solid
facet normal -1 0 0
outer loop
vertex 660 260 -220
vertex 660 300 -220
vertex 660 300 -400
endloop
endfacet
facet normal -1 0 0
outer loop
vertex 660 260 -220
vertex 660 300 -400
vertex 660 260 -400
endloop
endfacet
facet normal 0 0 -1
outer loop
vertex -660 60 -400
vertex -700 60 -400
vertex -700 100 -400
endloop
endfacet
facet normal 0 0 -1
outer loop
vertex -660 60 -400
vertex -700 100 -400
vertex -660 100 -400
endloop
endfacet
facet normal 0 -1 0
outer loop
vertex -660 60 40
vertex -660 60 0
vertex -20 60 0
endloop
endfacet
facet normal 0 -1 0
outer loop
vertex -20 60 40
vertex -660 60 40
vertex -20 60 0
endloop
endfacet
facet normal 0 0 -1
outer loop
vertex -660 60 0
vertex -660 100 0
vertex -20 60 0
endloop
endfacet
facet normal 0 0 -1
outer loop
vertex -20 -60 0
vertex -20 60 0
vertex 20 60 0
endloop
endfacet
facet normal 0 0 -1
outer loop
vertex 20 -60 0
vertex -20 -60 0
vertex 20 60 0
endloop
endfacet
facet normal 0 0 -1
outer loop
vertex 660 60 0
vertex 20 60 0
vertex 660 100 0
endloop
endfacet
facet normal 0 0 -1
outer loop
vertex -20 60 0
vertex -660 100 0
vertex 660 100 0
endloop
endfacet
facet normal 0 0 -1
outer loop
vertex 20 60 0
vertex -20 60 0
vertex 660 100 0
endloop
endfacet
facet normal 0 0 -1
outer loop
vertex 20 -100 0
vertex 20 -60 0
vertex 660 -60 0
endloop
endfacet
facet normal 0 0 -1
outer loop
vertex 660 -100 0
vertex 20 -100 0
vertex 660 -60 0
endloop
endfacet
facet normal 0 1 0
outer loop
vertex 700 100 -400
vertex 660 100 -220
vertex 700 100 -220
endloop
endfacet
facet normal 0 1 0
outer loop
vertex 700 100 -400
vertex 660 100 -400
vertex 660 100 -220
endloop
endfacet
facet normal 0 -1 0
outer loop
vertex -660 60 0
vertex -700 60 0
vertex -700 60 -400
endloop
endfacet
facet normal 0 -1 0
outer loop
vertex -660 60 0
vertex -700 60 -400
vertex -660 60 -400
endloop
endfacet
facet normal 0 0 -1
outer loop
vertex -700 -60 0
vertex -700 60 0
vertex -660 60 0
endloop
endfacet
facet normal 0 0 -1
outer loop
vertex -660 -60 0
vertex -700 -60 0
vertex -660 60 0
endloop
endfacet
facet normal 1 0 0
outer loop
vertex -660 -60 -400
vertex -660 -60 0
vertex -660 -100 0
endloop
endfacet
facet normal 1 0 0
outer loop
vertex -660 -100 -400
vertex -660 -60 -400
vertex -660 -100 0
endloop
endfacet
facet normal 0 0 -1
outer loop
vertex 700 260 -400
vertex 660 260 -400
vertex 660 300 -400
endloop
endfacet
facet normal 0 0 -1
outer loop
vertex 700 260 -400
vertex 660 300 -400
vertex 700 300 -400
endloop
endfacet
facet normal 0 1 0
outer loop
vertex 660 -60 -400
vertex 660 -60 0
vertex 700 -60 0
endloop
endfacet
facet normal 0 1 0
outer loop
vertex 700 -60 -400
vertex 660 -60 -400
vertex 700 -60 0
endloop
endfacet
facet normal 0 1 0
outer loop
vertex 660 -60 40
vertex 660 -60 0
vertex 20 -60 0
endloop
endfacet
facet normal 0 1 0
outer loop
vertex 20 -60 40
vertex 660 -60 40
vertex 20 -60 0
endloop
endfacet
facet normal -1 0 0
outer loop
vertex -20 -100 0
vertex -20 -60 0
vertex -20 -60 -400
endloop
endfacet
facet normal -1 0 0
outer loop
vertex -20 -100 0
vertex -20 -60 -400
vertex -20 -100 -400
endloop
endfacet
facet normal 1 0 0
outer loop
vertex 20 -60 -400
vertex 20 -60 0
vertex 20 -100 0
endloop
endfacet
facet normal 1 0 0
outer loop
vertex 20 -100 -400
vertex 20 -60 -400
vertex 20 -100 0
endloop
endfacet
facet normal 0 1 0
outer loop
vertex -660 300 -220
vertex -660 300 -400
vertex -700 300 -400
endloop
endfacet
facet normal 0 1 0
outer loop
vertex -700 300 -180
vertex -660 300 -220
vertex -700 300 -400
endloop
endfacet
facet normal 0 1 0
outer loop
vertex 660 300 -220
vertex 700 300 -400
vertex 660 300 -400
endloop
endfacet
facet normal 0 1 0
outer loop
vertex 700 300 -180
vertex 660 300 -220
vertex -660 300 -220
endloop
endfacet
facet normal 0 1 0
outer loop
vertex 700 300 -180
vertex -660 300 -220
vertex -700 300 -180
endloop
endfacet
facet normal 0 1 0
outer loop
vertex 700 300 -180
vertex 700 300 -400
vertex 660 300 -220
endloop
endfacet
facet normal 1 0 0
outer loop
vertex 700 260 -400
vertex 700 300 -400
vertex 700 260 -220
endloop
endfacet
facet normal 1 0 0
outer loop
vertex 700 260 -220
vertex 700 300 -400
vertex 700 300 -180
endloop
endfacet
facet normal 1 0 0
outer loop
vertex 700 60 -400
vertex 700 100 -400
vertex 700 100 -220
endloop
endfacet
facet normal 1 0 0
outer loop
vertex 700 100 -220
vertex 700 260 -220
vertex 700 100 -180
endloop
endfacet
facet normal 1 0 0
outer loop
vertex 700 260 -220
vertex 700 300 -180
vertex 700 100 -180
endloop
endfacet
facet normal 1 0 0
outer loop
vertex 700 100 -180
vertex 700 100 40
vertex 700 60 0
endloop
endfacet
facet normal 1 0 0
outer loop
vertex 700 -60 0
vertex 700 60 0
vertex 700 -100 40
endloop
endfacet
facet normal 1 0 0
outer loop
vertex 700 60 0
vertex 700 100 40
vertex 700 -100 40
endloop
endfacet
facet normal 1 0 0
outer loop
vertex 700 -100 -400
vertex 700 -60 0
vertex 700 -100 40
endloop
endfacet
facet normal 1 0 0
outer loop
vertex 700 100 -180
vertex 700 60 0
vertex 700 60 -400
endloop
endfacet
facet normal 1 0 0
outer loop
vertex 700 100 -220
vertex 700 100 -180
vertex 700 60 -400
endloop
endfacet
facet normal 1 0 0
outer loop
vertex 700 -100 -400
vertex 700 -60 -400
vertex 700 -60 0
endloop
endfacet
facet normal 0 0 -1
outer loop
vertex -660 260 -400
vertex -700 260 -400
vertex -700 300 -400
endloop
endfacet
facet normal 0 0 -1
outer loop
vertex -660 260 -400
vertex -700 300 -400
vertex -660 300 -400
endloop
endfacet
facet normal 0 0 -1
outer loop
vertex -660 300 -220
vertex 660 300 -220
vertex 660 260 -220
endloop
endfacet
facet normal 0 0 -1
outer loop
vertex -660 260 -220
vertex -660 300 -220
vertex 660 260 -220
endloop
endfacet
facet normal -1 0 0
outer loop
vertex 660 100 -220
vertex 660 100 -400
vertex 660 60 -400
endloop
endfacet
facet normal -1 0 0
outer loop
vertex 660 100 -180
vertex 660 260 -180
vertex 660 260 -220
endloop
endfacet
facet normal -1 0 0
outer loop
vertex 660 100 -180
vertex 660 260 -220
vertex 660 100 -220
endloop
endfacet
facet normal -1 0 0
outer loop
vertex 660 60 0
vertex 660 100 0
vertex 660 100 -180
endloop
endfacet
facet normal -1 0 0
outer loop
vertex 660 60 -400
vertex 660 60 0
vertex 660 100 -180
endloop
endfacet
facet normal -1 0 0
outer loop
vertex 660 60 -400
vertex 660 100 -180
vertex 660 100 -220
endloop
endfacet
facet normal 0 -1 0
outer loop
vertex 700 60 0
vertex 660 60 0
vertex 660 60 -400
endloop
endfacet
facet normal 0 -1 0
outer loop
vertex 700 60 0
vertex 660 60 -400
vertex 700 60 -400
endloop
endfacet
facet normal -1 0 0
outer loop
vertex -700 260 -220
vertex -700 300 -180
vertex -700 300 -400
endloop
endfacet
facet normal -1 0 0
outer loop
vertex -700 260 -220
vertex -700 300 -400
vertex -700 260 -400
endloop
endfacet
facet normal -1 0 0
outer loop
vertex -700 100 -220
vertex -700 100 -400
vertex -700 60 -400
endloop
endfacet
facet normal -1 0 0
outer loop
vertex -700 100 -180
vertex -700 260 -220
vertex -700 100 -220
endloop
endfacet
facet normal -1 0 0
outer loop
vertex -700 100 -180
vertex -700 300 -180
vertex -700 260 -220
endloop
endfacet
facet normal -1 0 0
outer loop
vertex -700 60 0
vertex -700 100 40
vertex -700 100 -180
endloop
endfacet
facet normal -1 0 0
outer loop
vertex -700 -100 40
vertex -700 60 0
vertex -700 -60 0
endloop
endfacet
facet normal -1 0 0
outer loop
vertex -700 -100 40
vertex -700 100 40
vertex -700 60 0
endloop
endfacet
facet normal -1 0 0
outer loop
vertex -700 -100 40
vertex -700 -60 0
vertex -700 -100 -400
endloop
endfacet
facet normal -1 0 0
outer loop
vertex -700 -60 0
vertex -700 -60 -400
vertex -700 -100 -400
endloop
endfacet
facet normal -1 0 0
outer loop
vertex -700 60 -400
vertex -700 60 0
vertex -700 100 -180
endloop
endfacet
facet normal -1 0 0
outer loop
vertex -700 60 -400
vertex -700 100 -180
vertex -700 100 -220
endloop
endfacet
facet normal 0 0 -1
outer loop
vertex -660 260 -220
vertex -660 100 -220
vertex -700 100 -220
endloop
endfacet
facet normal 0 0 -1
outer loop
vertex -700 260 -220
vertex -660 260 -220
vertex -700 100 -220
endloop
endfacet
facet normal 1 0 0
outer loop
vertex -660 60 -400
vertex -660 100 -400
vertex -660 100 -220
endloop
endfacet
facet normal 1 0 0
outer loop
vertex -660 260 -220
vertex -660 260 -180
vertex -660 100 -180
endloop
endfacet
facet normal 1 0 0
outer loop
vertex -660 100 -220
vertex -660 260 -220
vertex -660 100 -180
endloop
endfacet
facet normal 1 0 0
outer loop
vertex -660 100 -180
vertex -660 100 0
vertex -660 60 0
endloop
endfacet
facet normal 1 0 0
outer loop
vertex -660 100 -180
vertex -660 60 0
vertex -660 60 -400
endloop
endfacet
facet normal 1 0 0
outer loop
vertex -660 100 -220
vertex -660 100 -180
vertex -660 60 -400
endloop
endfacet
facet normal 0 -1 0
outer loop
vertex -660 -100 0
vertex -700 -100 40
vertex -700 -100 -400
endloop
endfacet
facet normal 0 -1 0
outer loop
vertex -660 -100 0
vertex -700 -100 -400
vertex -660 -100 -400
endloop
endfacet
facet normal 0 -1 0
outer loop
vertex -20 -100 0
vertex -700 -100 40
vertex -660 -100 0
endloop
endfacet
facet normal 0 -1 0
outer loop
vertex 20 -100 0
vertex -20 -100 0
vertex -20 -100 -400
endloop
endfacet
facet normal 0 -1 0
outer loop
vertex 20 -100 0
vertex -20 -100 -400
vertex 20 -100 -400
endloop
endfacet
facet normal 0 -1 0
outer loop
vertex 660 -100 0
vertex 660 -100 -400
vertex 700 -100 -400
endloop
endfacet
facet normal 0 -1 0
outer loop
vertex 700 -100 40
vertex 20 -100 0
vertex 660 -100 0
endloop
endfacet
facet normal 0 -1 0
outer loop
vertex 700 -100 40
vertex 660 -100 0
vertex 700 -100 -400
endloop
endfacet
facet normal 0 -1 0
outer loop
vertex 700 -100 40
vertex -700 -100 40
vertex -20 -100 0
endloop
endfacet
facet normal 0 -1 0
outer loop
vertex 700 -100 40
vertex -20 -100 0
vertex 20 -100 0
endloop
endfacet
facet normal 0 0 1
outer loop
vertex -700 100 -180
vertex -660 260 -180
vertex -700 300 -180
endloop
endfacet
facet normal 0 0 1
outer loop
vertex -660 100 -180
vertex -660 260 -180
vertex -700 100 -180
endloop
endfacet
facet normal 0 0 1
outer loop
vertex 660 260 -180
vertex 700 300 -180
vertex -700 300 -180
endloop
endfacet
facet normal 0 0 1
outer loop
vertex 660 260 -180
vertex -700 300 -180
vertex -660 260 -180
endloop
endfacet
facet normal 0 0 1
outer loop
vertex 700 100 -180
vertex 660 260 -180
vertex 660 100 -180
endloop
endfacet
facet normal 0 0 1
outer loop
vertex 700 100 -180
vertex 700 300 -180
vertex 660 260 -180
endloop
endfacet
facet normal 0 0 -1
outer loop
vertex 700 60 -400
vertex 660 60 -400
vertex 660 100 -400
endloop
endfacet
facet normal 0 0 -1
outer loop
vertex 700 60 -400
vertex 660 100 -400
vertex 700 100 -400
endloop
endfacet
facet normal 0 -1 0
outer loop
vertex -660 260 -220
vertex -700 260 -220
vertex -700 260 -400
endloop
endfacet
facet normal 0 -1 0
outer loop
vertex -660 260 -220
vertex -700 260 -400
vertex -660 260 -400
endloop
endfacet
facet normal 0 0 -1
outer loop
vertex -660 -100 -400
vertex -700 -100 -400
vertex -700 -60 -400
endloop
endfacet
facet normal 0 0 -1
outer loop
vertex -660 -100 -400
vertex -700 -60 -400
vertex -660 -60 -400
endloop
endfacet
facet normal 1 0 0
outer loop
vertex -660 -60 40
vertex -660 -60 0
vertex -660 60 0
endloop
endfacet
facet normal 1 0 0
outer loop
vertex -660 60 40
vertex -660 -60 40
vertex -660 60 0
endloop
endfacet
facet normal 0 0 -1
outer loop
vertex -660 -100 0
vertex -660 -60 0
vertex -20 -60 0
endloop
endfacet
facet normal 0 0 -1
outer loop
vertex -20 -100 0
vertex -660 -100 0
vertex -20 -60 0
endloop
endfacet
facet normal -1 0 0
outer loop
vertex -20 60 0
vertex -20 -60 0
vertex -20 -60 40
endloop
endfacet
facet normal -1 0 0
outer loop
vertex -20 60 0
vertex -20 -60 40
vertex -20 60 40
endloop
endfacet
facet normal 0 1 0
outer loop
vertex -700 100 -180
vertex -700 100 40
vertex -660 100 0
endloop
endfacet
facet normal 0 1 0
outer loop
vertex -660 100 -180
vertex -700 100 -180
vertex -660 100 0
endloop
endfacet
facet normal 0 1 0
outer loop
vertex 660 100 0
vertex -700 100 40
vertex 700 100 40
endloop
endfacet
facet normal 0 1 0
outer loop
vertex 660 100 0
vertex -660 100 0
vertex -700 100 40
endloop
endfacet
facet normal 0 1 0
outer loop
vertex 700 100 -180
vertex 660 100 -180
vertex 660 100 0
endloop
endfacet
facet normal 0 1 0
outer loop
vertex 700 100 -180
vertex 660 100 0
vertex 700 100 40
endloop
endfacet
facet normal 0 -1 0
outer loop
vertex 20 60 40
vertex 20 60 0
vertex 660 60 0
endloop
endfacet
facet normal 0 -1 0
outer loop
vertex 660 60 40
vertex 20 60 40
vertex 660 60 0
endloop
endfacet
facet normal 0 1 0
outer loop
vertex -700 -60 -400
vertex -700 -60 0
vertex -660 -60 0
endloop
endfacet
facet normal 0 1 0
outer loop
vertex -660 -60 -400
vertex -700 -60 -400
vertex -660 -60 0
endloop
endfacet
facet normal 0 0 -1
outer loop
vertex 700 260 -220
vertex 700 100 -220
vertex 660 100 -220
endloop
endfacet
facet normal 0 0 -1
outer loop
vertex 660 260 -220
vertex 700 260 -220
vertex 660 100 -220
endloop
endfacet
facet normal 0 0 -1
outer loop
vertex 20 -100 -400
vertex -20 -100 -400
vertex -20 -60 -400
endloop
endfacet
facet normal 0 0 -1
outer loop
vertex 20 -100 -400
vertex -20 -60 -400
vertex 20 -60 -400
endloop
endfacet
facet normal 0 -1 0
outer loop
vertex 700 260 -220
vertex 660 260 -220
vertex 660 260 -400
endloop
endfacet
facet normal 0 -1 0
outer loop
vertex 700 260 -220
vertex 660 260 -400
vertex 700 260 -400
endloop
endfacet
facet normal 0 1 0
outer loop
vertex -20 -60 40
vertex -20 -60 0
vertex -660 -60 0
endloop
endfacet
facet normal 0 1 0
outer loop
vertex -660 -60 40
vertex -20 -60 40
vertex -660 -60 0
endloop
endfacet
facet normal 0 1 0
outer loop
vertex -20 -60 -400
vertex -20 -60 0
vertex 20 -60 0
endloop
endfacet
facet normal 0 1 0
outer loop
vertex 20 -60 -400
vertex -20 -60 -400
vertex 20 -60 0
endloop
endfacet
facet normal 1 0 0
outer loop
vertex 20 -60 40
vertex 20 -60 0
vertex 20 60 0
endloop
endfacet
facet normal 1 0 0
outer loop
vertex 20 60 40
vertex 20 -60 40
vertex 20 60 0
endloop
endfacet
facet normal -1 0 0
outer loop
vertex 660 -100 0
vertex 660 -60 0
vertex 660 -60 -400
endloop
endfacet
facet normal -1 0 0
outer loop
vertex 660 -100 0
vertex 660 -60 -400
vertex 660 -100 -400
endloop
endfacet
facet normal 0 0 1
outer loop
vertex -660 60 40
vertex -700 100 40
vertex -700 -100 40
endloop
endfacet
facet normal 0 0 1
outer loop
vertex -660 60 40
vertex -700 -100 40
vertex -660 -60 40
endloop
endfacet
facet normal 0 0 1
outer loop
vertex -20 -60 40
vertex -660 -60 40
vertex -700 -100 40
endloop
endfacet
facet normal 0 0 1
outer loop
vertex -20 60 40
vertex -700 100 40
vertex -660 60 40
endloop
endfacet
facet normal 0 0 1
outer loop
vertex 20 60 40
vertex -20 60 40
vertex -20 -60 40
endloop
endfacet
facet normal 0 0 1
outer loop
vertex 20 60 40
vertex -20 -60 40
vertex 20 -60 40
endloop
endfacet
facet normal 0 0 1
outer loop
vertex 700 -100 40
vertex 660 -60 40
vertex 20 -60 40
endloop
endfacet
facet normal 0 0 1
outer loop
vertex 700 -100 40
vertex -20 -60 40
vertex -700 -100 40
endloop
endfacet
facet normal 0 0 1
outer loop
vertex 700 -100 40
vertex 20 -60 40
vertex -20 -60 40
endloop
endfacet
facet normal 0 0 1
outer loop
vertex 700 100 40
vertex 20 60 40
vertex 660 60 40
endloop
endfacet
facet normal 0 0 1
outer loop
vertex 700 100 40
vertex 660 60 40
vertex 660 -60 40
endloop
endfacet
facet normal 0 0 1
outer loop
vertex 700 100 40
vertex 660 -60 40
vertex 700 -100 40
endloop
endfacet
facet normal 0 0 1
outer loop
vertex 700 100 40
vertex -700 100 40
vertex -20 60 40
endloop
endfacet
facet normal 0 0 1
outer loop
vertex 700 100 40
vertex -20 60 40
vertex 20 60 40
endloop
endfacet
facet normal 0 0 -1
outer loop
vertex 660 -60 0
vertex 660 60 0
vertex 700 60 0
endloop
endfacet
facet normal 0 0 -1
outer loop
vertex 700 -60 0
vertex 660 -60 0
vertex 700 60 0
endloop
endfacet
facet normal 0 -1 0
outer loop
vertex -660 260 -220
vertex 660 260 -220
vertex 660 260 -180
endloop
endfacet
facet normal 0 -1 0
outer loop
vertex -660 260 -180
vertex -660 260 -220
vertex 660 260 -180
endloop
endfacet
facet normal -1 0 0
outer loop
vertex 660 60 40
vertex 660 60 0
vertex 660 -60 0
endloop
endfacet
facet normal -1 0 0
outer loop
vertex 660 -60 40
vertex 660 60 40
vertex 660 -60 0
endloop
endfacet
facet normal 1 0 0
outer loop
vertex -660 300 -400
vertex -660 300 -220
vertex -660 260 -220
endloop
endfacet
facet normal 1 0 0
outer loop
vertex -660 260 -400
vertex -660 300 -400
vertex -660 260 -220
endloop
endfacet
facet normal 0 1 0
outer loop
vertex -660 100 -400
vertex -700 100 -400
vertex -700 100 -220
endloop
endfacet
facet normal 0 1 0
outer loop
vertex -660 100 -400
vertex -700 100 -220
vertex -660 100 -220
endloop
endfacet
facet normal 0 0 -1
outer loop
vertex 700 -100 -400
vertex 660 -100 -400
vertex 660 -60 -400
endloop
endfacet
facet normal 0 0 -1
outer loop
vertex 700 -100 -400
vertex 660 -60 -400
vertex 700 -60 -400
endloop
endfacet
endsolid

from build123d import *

# Parameters (mm, degrees)
F0_W      = 1400
F0_H      = 200
F0_W_2    = 40
F0_H_2    = 120
F1_DEPTH  = 40
F2_W      = 40
F2_H      = 40
F3_DEPTH  = 400
F4_W      = 40
F4_H      = 40
F5_DEPTH  = 200
F7_W      = 40
F7_H      = 40
F6_W      = 40
F6_H      = 40
F8_DEPTH  = 180
F9_W      = 40
F9_H      = 40
F10_DEPTH = 1320


# Not quite as in the source:
# - a feature names something its author has since deleted; it is built from what else it names


with BuildPart() as f1:
    # F0 (on Top) → F1 (new body)
    with BuildSketch(Plane.XY):
        Rectangle(F0_W, F0_H)
        Polygon((20, 60), (660, 60), (660, -60), (20, -60), (-20, -60), (-660, -60), (-660, 60), (-20, 60), align=None, mode=Mode.SUBTRACT)
        Rectangle(F0_W_2, F0_H_2)
    extrude(amount=F1_DEPTH)

    # F2 (on face) → F3 (join)
    with BuildSketch(Plane(origin=(0, 0, 0), x_dir=(1, 0, 0), z_dir=(0, 0, -1))):
        with Locations((-680, 80)):
            Rectangle(F2_W, F2_H)
        with Locations((-680, -80)):
            Rectangle(F2_W, F2_H)
        with Locations((680, 80)):
            Rectangle(F2_W, F2_H)
        with Locations((680, -80)):
            Rectangle(F2_W, F2_H)
        with Locations((0, 80)):
            Rectangle(F2_W, F2_H)
    extrude(amount=F3_DEPTH)

    # F4 (on face) → F5 (join)
    with BuildSketch(Plane(origin=(0, 100, 0), x_dir=(-1, 0, 0), z_dir=(0, 1, 0))):
        with Locations((-680, -200)):
            Rectangle(F4_W, F4_H)
        with Locations((680, -200)):
            Rectangle(F4_W, F4_H)
    extrude(amount=F5_DEPTH)

    # F7 (on face) + F6 (on face) → F8 (join)
    with BuildSketch(Plane(origin=(0, 0, -220), x_dir=(1, 0, 0), z_dir=(0, 0, -1))):
        with Locations((680, -280)):
            Rectangle(F7_W, F7_H)
    with BuildSketch(Plane(origin=(0, 0, -220), x_dir=(1, 0, 0), z_dir=(0, 0, -1))):
        with Locations((-680, -280)):
            Rectangle(F6_W, F6_H)
    extrude(amount=F8_DEPTH)

    # F9 (on face) → F10 (join, through all)
    with BuildSketch(Plane(origin=(660, 0, 0), x_dir=(0, -1, 0), z_dir=(-1, 0, 0))):
        with Locations((-280, -200)):
            Rectangle(F9_W, F9_H)
    extrude(amount=F10_DEPTH)


solid = f1.part
